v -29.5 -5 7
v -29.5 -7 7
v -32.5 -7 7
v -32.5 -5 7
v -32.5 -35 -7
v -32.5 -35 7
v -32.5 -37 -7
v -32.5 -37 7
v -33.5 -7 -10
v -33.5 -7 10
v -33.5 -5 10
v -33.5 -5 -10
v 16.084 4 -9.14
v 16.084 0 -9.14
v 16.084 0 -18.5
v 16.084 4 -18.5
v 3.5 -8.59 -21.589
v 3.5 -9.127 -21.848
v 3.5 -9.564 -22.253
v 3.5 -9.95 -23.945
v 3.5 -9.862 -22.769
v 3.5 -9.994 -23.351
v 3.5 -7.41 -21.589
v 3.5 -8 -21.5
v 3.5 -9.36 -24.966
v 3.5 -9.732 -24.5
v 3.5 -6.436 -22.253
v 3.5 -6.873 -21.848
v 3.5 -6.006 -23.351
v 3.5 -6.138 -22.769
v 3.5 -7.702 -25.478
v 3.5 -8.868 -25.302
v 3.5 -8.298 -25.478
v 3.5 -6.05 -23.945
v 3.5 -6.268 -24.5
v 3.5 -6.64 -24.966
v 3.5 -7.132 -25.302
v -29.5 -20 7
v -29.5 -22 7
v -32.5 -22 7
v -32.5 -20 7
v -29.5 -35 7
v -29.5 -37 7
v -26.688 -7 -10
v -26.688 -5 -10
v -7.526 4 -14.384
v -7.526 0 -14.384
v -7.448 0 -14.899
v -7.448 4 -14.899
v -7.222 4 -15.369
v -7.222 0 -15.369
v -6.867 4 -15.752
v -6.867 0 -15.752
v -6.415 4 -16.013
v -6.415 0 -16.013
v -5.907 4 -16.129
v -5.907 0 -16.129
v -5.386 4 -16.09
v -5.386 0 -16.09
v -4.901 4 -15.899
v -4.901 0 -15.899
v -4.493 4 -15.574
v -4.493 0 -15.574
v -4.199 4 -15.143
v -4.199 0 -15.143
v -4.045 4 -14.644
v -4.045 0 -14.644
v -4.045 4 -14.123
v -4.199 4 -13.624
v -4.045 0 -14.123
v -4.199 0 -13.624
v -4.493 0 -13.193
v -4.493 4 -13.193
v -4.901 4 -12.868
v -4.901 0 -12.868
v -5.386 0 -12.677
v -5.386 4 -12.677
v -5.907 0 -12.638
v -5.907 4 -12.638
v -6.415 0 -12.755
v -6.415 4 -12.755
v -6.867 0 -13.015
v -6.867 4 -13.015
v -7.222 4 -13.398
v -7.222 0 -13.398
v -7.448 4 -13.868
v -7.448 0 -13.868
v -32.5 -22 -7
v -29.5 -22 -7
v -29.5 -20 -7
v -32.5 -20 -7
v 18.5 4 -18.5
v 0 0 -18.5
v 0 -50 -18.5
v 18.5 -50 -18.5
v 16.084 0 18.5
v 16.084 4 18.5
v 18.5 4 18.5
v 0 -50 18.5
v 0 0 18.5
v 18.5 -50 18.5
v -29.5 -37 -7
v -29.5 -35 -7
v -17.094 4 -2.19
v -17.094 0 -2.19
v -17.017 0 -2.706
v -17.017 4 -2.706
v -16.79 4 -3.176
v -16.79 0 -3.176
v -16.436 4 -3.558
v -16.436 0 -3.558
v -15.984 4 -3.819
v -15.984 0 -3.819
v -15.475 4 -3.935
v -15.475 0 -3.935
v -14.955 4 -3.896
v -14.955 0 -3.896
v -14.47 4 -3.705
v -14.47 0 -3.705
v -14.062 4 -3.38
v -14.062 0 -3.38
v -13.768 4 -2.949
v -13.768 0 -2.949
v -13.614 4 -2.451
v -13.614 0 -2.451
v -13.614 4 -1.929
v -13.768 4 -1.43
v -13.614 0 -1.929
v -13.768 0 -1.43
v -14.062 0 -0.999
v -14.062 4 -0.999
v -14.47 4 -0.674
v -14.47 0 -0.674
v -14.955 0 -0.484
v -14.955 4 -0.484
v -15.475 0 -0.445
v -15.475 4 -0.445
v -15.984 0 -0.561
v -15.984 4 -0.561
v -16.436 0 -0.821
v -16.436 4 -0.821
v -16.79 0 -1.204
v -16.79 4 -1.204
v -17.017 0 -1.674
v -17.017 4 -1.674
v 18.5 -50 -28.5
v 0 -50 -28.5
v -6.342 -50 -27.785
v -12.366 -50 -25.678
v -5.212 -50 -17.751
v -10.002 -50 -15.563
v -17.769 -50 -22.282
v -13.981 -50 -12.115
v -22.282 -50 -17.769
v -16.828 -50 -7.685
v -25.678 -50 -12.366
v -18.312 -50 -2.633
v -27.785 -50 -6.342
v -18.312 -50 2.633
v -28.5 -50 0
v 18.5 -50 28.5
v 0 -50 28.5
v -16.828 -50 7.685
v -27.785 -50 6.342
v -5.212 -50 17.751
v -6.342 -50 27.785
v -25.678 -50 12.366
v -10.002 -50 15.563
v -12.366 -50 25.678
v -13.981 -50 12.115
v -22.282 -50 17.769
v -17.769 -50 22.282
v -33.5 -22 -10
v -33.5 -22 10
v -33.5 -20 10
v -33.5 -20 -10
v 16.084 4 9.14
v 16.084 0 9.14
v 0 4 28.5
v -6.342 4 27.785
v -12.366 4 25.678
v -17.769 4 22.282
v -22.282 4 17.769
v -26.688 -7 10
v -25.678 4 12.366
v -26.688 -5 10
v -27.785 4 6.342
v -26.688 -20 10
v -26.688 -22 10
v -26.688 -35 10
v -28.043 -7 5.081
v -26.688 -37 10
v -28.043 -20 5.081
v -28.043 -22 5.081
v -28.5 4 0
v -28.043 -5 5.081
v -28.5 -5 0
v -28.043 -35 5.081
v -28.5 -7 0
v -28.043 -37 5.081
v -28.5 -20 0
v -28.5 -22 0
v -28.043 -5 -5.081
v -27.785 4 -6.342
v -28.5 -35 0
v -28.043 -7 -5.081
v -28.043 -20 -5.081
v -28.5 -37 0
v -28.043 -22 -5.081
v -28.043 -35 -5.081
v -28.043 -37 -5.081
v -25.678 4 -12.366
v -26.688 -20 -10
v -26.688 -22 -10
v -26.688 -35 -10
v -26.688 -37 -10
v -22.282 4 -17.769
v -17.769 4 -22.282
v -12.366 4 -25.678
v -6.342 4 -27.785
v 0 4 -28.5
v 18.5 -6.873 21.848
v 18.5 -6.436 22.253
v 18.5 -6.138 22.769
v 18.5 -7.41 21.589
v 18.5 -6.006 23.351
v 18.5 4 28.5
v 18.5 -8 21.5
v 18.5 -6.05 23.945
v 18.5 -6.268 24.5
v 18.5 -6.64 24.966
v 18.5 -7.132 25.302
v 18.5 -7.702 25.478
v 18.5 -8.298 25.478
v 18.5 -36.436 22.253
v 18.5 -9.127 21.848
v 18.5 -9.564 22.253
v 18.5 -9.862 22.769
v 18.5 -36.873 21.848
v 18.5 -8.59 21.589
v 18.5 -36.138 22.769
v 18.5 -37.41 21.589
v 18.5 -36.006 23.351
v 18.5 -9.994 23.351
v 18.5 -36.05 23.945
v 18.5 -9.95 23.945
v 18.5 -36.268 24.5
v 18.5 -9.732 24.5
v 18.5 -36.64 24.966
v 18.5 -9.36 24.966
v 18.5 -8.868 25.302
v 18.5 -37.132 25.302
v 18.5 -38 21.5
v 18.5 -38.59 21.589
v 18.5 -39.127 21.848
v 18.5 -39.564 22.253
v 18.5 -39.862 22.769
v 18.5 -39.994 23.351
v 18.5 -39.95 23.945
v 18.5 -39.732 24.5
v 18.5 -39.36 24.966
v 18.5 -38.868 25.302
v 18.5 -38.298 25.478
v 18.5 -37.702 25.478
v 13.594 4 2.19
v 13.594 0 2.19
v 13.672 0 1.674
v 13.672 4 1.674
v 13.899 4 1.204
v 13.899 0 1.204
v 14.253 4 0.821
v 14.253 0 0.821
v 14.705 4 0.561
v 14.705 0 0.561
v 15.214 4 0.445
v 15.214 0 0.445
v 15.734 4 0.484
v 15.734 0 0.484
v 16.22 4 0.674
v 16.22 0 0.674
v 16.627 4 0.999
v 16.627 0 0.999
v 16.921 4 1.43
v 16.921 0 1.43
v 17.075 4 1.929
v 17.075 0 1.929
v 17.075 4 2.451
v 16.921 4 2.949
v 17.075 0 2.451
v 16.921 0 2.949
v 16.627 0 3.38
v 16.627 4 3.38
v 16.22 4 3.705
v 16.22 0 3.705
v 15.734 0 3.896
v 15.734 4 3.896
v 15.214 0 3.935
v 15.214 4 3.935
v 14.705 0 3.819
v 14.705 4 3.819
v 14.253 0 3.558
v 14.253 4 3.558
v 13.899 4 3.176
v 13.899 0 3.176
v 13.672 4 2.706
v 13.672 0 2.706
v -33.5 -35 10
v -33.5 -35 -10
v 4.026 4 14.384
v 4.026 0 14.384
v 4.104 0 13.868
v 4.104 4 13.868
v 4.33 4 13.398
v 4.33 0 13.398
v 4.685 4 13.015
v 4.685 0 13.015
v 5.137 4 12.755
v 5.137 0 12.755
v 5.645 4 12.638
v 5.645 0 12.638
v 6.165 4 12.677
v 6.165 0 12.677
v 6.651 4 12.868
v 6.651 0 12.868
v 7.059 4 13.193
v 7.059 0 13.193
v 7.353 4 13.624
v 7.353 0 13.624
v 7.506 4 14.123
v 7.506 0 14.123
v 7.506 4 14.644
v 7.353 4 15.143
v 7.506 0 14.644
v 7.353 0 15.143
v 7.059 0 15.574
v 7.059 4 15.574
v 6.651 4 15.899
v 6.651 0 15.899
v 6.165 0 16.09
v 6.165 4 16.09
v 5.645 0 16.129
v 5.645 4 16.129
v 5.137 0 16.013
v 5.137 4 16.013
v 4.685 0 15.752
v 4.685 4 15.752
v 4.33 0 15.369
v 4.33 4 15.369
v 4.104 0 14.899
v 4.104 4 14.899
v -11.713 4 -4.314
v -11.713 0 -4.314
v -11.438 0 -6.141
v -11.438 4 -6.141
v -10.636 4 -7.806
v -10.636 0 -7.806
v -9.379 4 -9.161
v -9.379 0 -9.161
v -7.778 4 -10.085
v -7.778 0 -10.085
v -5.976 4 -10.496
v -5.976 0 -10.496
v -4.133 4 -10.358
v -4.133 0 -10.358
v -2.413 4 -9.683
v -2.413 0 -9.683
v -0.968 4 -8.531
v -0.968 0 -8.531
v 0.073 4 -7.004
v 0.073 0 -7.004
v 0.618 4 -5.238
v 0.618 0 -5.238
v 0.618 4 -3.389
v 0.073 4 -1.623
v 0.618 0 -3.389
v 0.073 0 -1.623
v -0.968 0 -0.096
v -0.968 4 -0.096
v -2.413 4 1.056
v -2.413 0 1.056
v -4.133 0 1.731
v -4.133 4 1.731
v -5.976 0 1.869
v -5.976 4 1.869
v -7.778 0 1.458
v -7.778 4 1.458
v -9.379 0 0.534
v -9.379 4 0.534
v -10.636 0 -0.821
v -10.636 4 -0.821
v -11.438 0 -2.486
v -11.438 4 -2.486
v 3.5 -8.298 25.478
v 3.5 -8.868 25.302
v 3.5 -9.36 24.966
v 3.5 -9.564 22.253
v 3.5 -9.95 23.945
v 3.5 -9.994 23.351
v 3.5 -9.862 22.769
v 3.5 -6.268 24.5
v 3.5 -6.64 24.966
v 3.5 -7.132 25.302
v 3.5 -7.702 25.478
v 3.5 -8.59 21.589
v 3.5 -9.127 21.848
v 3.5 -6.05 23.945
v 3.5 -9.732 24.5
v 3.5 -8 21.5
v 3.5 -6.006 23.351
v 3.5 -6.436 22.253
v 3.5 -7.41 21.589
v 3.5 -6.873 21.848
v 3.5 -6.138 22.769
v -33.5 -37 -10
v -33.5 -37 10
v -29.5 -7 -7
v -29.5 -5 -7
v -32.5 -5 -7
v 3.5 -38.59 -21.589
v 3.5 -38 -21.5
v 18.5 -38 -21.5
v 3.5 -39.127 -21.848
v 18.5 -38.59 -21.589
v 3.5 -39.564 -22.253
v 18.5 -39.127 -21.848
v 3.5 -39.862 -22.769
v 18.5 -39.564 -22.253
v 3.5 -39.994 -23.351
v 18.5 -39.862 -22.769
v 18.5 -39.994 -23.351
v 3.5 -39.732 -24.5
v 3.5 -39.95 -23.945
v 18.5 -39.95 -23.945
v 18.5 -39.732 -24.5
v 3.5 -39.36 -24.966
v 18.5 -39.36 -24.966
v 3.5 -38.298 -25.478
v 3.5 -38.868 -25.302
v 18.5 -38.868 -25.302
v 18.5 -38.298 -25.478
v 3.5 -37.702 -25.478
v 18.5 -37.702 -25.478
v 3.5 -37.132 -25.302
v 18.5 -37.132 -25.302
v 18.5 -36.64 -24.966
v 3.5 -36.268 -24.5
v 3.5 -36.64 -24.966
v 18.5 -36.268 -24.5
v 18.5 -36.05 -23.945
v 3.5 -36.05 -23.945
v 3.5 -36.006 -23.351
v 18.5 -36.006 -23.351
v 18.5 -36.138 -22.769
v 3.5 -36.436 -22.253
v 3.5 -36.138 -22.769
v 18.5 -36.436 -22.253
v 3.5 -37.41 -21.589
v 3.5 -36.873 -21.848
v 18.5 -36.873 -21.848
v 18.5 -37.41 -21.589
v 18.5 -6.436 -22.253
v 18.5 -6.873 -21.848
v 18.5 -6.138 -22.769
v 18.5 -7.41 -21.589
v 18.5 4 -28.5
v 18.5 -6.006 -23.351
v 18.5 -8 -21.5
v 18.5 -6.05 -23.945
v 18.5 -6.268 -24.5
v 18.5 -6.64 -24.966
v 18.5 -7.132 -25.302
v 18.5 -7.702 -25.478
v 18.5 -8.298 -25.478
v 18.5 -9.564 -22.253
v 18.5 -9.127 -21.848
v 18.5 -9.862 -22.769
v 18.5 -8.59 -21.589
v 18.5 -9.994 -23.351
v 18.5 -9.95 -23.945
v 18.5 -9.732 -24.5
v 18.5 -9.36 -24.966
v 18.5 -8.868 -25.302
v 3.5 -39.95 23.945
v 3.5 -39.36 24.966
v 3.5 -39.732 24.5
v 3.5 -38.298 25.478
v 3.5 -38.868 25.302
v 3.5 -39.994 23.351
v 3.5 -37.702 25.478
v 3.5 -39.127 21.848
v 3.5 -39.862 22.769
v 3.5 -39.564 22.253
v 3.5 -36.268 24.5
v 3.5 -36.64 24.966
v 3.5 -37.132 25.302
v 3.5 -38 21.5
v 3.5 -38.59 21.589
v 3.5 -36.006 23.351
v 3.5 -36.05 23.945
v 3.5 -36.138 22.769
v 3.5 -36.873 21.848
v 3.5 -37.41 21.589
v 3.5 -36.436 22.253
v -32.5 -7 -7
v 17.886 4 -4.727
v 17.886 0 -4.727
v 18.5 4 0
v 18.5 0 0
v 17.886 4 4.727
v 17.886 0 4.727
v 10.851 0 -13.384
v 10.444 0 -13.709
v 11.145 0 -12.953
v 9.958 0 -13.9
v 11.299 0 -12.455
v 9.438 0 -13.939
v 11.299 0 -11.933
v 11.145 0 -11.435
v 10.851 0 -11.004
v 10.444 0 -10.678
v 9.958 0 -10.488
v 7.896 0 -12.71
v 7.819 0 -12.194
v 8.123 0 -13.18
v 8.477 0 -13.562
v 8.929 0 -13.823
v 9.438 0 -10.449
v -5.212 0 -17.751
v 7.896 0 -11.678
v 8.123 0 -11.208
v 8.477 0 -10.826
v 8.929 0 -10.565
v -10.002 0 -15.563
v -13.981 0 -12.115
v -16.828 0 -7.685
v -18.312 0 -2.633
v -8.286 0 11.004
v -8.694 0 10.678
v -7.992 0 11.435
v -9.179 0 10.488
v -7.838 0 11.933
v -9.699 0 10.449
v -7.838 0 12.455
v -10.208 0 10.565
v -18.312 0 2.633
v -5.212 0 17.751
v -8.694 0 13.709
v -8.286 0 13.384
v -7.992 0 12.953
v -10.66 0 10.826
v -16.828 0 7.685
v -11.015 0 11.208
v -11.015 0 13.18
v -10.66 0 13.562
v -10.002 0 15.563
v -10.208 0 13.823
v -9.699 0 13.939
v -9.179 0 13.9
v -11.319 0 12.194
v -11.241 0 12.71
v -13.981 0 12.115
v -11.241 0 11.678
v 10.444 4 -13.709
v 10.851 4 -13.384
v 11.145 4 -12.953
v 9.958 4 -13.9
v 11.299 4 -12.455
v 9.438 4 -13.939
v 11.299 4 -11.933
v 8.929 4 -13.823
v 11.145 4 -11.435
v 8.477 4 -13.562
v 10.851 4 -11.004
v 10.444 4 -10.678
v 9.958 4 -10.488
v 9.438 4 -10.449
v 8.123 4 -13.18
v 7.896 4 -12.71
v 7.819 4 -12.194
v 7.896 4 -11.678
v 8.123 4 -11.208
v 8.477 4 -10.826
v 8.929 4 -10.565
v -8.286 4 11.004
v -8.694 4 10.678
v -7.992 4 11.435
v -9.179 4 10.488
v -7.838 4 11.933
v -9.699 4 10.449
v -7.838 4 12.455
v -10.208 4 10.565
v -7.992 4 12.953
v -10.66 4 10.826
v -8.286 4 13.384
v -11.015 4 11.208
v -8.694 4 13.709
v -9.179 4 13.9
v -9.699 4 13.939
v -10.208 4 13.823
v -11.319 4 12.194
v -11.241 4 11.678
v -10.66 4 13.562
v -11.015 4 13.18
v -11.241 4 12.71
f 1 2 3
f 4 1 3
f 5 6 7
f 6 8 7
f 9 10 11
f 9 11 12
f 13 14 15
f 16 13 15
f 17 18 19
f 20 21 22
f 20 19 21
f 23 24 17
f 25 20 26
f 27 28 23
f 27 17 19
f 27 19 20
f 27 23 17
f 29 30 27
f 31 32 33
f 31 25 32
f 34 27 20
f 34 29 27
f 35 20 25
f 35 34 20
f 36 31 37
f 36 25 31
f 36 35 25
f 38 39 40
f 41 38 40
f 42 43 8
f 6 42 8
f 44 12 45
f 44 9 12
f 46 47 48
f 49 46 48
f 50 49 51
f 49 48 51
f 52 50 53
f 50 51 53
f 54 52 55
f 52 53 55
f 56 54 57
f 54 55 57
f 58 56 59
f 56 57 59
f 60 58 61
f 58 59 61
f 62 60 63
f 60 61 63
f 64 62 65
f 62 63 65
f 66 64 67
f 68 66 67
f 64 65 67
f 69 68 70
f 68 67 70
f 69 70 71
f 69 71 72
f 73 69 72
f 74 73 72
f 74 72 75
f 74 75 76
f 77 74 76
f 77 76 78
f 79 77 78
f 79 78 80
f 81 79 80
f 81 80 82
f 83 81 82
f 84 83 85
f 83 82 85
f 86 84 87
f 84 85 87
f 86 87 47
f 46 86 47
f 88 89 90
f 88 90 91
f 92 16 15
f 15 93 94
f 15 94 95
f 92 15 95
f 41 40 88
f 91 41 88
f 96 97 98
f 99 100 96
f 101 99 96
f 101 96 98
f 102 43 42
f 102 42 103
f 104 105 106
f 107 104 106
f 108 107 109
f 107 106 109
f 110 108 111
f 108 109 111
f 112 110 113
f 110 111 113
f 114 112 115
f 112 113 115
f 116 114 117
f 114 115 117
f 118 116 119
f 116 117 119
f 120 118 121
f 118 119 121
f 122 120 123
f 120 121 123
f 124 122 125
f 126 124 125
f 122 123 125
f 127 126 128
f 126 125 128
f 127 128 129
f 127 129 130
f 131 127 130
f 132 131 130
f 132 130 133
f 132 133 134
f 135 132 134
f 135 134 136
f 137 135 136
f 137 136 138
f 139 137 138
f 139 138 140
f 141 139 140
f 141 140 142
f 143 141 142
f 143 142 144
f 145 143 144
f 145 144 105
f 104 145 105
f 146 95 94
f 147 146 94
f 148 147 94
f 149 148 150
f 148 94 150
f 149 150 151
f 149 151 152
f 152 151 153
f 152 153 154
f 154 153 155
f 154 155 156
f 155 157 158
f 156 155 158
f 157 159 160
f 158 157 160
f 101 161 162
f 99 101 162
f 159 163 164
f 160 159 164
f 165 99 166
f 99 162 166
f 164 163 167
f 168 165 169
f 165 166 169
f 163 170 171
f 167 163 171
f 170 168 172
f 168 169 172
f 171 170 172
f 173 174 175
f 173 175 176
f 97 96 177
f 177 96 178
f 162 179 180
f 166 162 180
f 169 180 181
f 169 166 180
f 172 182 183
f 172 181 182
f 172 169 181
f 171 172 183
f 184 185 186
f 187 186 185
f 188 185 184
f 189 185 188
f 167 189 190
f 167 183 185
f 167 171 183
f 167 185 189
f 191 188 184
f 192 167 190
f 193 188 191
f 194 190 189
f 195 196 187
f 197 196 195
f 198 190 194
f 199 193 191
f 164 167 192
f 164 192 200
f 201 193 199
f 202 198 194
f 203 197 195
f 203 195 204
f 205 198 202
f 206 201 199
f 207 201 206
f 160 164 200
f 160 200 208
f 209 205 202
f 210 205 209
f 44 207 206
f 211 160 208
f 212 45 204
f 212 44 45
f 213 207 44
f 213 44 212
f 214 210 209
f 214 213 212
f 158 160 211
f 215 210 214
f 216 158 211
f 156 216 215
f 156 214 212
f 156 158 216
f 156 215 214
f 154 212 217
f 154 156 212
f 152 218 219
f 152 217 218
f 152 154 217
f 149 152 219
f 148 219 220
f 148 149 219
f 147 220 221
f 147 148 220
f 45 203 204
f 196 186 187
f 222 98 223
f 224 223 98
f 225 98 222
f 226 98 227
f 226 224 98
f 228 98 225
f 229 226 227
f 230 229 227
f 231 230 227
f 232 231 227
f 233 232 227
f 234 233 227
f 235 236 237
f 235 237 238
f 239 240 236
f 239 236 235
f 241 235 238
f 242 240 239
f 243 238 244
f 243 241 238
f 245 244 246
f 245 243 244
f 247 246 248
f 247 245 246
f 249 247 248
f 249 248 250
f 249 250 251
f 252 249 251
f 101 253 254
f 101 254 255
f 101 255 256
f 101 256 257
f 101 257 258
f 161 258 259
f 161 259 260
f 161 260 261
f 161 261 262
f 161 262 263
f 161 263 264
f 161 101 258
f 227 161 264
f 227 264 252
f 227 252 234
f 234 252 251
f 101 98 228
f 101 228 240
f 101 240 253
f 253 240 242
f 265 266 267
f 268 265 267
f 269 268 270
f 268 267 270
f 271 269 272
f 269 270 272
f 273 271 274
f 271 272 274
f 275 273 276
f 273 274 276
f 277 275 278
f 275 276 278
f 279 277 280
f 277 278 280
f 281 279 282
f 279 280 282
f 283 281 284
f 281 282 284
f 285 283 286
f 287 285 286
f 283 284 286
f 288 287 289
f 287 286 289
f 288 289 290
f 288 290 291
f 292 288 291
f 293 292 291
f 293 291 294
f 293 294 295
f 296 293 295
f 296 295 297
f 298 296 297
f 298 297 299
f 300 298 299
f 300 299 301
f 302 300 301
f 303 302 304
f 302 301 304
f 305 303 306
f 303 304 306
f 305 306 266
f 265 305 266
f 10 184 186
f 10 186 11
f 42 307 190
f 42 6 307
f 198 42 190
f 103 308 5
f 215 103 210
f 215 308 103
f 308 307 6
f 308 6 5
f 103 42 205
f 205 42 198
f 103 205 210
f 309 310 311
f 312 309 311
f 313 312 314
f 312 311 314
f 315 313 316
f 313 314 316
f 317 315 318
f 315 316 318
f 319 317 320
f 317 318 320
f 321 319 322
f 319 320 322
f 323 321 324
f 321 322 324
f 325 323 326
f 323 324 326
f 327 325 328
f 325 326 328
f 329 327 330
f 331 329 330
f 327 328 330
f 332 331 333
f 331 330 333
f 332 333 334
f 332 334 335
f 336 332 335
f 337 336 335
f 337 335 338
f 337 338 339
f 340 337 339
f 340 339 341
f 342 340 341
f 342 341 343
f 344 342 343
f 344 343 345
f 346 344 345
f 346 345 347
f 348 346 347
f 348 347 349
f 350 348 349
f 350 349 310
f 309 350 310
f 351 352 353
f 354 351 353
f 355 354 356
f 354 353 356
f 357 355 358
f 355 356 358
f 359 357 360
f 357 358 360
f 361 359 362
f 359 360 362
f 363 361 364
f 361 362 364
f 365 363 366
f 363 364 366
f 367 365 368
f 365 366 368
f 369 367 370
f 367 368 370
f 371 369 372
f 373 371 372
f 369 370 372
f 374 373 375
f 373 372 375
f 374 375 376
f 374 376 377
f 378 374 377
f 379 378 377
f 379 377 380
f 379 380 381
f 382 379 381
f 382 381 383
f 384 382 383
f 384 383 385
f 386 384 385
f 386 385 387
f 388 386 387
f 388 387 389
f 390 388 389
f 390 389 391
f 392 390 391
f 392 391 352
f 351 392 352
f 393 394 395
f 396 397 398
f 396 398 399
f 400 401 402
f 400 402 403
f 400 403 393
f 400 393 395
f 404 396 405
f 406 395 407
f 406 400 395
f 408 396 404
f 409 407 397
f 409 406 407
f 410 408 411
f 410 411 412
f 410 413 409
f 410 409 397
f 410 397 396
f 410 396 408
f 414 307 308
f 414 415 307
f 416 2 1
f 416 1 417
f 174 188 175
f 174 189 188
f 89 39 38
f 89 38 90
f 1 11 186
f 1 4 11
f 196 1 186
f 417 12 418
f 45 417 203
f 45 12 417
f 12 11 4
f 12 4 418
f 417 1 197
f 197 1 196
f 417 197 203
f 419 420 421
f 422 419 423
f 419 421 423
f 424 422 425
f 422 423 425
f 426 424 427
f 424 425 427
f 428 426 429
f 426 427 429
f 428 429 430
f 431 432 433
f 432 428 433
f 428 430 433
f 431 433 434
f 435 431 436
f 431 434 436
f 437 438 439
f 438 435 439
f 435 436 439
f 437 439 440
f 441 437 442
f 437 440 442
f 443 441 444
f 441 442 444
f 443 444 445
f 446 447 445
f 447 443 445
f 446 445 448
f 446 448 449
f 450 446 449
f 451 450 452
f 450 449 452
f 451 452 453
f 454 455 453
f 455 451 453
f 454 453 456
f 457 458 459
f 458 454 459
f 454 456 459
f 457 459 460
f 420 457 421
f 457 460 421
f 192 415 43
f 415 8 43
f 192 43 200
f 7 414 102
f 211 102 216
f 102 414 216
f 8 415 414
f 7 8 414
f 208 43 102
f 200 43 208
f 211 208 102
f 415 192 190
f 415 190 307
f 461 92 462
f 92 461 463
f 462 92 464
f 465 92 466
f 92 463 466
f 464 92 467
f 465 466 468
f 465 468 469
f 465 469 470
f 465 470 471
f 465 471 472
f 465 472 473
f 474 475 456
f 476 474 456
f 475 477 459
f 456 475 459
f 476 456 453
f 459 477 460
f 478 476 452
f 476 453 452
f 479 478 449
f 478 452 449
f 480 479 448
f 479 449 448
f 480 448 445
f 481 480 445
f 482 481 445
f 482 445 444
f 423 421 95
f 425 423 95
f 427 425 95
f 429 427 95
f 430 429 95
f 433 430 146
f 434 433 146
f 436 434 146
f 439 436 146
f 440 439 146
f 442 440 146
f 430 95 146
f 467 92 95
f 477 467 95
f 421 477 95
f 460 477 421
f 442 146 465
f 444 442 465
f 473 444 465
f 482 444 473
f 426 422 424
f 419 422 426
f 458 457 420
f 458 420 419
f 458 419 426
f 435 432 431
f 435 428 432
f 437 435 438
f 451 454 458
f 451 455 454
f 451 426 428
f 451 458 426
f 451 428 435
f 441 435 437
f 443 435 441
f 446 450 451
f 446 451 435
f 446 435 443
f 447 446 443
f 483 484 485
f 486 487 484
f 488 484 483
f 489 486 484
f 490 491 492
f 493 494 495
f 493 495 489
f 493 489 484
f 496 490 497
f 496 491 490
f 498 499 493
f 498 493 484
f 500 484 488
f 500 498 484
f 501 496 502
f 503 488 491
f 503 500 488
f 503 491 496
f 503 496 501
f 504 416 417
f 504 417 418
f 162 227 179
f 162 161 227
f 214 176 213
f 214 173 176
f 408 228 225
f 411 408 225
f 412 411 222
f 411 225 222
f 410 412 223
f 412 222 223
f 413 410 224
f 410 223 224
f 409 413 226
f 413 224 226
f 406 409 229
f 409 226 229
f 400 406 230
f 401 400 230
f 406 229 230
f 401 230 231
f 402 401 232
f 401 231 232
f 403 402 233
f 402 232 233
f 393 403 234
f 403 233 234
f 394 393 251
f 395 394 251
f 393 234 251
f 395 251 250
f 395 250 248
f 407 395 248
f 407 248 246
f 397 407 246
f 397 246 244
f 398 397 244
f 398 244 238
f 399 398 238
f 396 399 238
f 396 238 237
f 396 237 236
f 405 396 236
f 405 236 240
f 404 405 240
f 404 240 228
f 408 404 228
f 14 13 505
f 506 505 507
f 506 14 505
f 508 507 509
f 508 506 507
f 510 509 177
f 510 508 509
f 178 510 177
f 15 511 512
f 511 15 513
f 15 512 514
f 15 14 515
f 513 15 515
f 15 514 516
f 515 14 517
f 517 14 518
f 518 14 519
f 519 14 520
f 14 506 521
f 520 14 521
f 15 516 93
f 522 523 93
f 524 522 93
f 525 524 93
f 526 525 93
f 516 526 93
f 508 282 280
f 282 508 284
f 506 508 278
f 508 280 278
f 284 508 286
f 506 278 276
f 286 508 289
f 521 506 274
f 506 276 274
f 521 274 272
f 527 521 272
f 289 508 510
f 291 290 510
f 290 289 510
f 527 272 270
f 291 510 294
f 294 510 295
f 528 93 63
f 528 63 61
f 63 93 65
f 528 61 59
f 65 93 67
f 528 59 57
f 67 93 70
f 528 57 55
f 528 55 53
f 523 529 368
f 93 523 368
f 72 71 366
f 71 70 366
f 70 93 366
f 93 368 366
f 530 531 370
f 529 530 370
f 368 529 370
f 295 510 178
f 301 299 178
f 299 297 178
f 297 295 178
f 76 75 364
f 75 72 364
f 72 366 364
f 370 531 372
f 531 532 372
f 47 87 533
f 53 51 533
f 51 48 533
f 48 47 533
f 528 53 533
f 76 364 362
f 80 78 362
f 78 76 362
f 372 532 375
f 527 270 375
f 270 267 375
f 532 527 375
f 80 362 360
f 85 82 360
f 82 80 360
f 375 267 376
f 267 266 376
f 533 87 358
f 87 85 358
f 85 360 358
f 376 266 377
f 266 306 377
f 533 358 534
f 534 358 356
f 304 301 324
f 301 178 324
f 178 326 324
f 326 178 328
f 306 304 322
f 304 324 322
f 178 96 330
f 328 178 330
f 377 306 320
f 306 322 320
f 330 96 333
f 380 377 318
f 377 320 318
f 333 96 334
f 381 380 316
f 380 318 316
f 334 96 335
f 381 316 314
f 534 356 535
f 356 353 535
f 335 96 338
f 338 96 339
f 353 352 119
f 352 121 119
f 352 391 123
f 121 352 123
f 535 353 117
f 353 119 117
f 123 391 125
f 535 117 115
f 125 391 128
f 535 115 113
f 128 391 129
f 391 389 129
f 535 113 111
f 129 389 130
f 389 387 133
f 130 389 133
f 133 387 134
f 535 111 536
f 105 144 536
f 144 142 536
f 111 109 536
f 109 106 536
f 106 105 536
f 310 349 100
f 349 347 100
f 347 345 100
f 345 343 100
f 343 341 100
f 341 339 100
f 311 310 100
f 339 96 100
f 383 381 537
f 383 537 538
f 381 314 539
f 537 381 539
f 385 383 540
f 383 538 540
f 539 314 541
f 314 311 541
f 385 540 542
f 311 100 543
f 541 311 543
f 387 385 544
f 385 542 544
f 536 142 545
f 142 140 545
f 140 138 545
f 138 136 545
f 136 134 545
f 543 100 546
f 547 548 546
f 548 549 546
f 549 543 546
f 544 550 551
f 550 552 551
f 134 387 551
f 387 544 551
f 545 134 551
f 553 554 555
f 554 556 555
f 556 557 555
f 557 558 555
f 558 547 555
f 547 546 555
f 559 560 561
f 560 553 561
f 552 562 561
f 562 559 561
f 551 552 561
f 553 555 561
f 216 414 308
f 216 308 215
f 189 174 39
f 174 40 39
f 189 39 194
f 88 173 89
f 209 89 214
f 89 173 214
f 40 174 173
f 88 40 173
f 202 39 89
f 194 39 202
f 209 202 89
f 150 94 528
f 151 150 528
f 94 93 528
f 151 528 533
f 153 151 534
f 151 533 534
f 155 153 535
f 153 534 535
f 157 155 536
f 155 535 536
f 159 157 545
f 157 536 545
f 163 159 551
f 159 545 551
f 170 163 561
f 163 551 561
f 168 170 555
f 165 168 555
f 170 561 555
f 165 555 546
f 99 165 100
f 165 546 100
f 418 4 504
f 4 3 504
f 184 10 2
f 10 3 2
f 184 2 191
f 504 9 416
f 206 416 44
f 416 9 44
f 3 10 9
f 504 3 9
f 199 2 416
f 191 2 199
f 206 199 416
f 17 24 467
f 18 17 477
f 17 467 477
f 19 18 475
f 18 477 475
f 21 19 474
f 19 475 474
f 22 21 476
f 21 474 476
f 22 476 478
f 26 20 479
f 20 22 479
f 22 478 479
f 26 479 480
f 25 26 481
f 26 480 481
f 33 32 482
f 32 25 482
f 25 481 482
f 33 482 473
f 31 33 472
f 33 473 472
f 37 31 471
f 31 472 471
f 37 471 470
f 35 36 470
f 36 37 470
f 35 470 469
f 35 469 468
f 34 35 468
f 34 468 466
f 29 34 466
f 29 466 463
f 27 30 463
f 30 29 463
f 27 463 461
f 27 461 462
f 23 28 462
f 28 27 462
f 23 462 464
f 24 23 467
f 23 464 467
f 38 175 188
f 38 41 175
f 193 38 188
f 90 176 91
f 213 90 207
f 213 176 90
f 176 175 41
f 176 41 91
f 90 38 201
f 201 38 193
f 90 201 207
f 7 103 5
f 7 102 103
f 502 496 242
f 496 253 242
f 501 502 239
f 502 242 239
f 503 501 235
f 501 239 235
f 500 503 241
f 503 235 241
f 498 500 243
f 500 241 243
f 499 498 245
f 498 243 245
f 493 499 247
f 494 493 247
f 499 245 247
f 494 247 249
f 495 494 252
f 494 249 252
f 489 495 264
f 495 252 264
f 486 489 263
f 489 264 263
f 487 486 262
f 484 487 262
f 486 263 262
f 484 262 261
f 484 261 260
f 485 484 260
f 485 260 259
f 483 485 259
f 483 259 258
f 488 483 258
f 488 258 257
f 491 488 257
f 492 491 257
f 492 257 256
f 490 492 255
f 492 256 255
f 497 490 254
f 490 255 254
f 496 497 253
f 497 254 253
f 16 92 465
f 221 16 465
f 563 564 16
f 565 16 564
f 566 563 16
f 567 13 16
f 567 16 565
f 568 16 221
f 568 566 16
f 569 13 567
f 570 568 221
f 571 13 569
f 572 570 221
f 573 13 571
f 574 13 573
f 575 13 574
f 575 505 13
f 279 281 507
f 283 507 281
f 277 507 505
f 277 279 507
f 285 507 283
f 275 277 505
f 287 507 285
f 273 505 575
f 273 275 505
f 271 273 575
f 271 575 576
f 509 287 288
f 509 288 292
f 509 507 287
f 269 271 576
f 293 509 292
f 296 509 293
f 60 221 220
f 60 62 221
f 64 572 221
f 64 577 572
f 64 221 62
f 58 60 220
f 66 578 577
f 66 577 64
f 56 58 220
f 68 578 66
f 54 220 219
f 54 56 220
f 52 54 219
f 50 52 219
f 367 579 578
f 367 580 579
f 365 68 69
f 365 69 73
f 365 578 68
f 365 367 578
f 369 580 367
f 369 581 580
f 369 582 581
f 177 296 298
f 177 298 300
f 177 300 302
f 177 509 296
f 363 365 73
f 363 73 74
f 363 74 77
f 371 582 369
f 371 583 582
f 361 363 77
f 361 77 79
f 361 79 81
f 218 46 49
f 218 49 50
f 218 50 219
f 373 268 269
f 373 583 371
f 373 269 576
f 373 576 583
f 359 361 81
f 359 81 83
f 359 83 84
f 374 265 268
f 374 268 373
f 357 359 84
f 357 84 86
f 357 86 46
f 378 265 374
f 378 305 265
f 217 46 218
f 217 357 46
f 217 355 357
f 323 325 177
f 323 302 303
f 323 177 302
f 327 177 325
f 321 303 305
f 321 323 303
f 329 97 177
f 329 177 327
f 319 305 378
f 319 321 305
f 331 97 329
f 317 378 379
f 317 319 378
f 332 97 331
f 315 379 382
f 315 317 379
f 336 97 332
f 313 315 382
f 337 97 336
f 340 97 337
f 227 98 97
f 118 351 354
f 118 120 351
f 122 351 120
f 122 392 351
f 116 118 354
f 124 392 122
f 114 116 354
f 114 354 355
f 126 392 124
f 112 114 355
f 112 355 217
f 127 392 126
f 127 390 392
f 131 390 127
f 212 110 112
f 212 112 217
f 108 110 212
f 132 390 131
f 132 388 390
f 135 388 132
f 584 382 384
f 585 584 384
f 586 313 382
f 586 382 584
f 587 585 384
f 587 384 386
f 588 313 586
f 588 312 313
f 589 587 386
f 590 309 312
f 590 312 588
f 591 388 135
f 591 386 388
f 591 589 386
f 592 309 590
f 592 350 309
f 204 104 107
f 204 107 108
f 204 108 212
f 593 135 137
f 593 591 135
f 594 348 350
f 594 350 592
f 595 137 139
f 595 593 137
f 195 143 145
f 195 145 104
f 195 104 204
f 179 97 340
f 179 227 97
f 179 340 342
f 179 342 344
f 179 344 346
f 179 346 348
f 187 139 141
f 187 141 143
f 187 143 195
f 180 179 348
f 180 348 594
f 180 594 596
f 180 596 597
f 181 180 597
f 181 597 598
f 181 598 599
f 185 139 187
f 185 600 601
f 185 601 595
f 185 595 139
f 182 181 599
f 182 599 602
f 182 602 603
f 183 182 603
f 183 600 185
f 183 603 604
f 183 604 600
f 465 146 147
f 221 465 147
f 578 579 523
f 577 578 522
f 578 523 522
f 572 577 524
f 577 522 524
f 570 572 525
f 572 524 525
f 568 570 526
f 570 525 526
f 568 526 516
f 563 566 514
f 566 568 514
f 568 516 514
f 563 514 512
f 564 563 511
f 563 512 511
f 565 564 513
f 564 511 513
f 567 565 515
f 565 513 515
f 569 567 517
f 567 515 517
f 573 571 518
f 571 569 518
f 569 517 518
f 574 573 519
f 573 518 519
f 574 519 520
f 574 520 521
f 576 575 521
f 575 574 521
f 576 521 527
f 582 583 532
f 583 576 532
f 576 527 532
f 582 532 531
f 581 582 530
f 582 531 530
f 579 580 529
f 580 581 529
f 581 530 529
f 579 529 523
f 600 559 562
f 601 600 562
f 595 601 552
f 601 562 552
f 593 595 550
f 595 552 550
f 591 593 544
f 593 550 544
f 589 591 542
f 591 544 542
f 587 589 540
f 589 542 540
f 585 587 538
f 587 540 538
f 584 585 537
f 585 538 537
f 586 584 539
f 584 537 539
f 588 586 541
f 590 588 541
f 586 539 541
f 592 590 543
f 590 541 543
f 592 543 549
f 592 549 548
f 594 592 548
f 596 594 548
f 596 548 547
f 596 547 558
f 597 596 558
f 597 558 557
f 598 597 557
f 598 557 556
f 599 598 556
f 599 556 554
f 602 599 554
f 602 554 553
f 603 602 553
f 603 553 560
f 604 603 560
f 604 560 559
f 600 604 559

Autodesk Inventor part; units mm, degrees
ref_plane "YZ Plane" through (0, 0, 0) normal (1, 0, 0) x (0, 1, 0)
ref_plane "XZ Plane" through (0, 0, 0) normal (0, 1, 0) x (-1, 0, 0)
ref_plane "XY Plane" through (0, 0, 0) normal (0, 0, 1) x (1, 0, 0)
sketch "Sketch1" plane through (0, 0, 0) normal (0, 1, 0) x (-1, 0, 0)
  circle A0 centre (0, 0) radius 18.5
  line L0 (5.5131, -10.5135) -> (5.5131, 1.8865)
  circle A1 centre (5.5131, -4.3135) radius 6.2
  line L1 (0, 0) -> (-24.4, 0)
  circle A2 centre (5.5131, -4.3135) radius 3
  circle A3 centre (5.5131, -4.3135) radius 40
  line L2 (-24.4, 0) -> (-24.4, -81.1676)
  line L3 (-24.4, -81.1676) -> (-24.4, 62.3764)
  line L4 (0, 0) -> (0, 28.5)
  line L5 (18.5, 0) -> (28.5, 0)
  line L6 (0, -18.5) -> (0, -28.5)
  arc A4 (28.5, 0) -> (0, 28.5) centre (0, 0) ccw
  arc A5 (0, -28.5) -> (28.5, 0) centre (0, 0) ccw
  line L7 (0, 18.5) -> (0, 23.5)
  line L8 (0, 18.5) -> (-18.5, 18.5)
  line L9 (-18.5, 18.5) -> (-18.5, 28.5)
  line L10 (-18.5, 28.5) -> (0, 28.5)
  line L11 (0, -18.5) -> (-18.5, -18.5)
  line L12 (-18.5, -18.5) -> (-18.5, -28.5)
  line L13 (-18.5, -28.5) -> (0, -28.5)
  line L14 (5.5131, -4.3135) -> (-72.1542, -4.3135)
  line L15 (0, 0) -> (5.5051, -4.3135)
  line L16 (0, 0) -> (6.9938, 0) construction
  line L17 (-16.0843, 18.5) -> (-16.0843, -18.5)
  circle A6 centre (0, 0) radius 15.5
  circle A7 centre (5.5051, -4.3135) radius 24.193
  circle A8 centre (5.5051, -4.3135) radius 10.066
  circle A9 centre (15.3445, -2.1897) radius 1.75
  circle A10 centre (9.5686, 12.1939) radius 1.75
  circle A11 centre (-5.7759, 14.3836) radius 1.75
  circle A12 centre (-15.3445, 2.1897) radius 1.75
  circle A13 centre (-9.5686, -12.1939) radius 1.75
  circle A14 centre (5.7759, -14.3836) radius 1.75
  point P0 (-17.3596, -28.5)
  point P1 (-18.5, -27.6751)
  point P2 (-17.3622, 28.5)
  point P3 (-18.5, 27.6767)
  point P4 (-16.0843, -9.1402)
  point P5 (-16.0843, 9.1402)
  dimension "d59" = 31
  dimension "d65" = 20.132
  dimension "d2" = 12.4
  dimension "d4" = 6
  dimension "d5" = 80
  dimension "d13" = 7
  dimension "d14" = 24.4
  dimension "d17" = 37
  dimension "d18" = 28.5
  dimension "d19" = 10
  dimension "d20" = 10
  dimension "d58" = 38.08
  dimension "d63" = 48.386
  dimension "d66" = 3.5
  dimension "d69" = 360
extrude "Extrusion1" add sketch "Sketch1" along normal blind 4 contours A0 L17 L14 A6 A13 A14 A8 A9 A10 L4 | L5 A5 A7 L6 A0 | A0 L4 A7 A4 L5 | L4 A6 A11 A12 L17 A7 A0 | L8 A7 L4 | A0 A7 L8 | L11 A7 L17 A0 | L6 A7 L11 | A7 L17 A0 | A0 L17 L8 A7 | A6 A10 A9 A8 L4 | L4 A8 L1 A6 A12 A11 | A7 L8 L9 A3 L10 L4 | L4 A4 A7 | A0 L14 L17 | A7 A5 L6 | L6 L13 L12 L11 A7 | L11 L17 A7 | L17 A7 L1 A0 | L17 A12 L1 A7 | A8 A9 A6 A14 L14 A1 L15 L4 | L4 L1 A8 | A0 A7 L1 L17 L14 | L17 L1 A6 L14 | L1 A7 A0 | L15 A1 L14 A8 L1 | A8 L14 A6 L1 | L14 A8 A14 A6 A13 | L17 A12 A6 L1 | A3 L9 L10 | A9 A8 A14 A6
extrude "Extrusion2" add sketch "Sketch1" against normal blind 50 contours L5 A5 A7 L6 A0 | A0 L4 A7 A4 L5 | L8 A7 L4 | L6 A7 L11 | A7 L8 L9 A3 L10 L4 | L4 A4 A7 | A7 A5 L6 | L6 L13 L12 L11 A7 | A3 L9 L10
sketch "Sketch2" plane through (18.5, 4, 28.5) normal (1, 0, 0) x (0, 0, -1)
  point P0 (28.5, -4)
ref_plane "Work Plane1" through (0, -22, 0) normal (0, 1, 0) x (1, 0, 0)
sketch "Sketch5" plane through (0, -22, 0) normal (0, 1, 0) x (1, 0, 0)
  arc A0 (0, 28.5) -> (0, -28.5) centre (0, 0) ccw projected
  line L0 (-28.5, 0) -> (-28.5, -10)
  line L1 (-28.5, -10) -> (-28.5, 10)
  line L2 (-28.5, 10) -> (-23.5, 10)
  line L3 (-23.5, 10) -> (-23.5, -10)
  line L4 (-23.5, -10) -> (-28.5, -10)
  line L5 (-28.5, -10) -> (-33.5, -10)
  line L6 (-33.5, -10) -> (-33.5, 10)
  line L7 (-33.5, 10) -> (-28.5, 10)
  line L8 (-28.5, 10) -> (-28.5, 7)
  line L9 (-28.5, 7) -> (-29.5, 7)
  line L10 (-29.5, 7) -> (-32.5, 7)
  line L11 (-32.5, 7) -> (-33.5, 7)
  line L12 (-28.5, -10) -> (-28.5, -7)
  line L13 (-28.5, -7) -> (-29.5, -7)
  line L14 (-29.5, -7) -> (-32.5, -7)
  line L15 (-32.5, -7) -> (-33.5, -7)
  line L16 (-33.5, -7) -> (-33.5, 7)
  line L17 (-32.5, -7) -> (-32.5, 7)
  line L18 (-29.5, -7) -> (-29.5, 7)
  point P0 (0, 0)
  point P1 (-26.688, 10)
  point P2 (-26.688, -10)
  dimension "d31" = 10
  dimension "d32" = 20
  dimension "d33" = 5
  dimension "d34" = 5
  dimension "d35" = 3
  dimension "d36" = 1
  dimension "d37" = 3
  dimension "d38" = 3
  dimension "d39" = 1
  dimension "d40" = 3
  dimension "d41" = 1
extrude "Extrusion3" add sketch "Sketch5" along normal blind 2 contours A0 L1 L2 | A0 L4 L0 | L0 L13 L18 L9 L1 | L1 L9 L10 L11 L6 L7 | L0 L5 L6 L15 L14 L13 | L11 L17 L15 L6
pattern_linear "Rectangular Pattern1" count 2 spacing 15 along (0, 1, 0) of "Extrusion3"
pattern_linear "Rectangular Pattern2" count 2 spacing 15 along (0, -1, 0) of "Extrusion3"
sketch "Sketch6" plane through (18.5, 4, 28.5) normal (1, 0, 0) x (0, 0, -1)
  line L0 (57, 0) -> (0, 0) projected
  line L1 (0, 0) -> (10, 0)
  line L2 (10, 0) -> (5, 0)
  line L3 (5, 0) -> (5, -54)
  line L4 (0, -54) -> (57, -54) projected
  line L5 (5, -27) -> (5, -12)
  line L6 (5, -12) -> (5, -42)
  circle A0 centre (5, -42) radius 2
  circle A1 centre (5, -12) radius 2
  point P0 (28.5, -4)
  dimension "d50" = 5
  dimension "d51" = 15
  dimension "d52" = 30
  dimension "d53" = 4
  dimension "d54" = 4
extrude "Extrusion4" cut sketch "Sketch6" against normal blind 15
mirror "Mirror1" about plane through (0, 0, 0) normal (0, 0, 1) of "Extrusion4"
sketch "Sketch7" plane through (18.5, 4, 28.5) normal (1, 0, 0) x (0, 0, -1)
  point P0 (28.5, -4)
properties part number "Motor_mount_Right"
